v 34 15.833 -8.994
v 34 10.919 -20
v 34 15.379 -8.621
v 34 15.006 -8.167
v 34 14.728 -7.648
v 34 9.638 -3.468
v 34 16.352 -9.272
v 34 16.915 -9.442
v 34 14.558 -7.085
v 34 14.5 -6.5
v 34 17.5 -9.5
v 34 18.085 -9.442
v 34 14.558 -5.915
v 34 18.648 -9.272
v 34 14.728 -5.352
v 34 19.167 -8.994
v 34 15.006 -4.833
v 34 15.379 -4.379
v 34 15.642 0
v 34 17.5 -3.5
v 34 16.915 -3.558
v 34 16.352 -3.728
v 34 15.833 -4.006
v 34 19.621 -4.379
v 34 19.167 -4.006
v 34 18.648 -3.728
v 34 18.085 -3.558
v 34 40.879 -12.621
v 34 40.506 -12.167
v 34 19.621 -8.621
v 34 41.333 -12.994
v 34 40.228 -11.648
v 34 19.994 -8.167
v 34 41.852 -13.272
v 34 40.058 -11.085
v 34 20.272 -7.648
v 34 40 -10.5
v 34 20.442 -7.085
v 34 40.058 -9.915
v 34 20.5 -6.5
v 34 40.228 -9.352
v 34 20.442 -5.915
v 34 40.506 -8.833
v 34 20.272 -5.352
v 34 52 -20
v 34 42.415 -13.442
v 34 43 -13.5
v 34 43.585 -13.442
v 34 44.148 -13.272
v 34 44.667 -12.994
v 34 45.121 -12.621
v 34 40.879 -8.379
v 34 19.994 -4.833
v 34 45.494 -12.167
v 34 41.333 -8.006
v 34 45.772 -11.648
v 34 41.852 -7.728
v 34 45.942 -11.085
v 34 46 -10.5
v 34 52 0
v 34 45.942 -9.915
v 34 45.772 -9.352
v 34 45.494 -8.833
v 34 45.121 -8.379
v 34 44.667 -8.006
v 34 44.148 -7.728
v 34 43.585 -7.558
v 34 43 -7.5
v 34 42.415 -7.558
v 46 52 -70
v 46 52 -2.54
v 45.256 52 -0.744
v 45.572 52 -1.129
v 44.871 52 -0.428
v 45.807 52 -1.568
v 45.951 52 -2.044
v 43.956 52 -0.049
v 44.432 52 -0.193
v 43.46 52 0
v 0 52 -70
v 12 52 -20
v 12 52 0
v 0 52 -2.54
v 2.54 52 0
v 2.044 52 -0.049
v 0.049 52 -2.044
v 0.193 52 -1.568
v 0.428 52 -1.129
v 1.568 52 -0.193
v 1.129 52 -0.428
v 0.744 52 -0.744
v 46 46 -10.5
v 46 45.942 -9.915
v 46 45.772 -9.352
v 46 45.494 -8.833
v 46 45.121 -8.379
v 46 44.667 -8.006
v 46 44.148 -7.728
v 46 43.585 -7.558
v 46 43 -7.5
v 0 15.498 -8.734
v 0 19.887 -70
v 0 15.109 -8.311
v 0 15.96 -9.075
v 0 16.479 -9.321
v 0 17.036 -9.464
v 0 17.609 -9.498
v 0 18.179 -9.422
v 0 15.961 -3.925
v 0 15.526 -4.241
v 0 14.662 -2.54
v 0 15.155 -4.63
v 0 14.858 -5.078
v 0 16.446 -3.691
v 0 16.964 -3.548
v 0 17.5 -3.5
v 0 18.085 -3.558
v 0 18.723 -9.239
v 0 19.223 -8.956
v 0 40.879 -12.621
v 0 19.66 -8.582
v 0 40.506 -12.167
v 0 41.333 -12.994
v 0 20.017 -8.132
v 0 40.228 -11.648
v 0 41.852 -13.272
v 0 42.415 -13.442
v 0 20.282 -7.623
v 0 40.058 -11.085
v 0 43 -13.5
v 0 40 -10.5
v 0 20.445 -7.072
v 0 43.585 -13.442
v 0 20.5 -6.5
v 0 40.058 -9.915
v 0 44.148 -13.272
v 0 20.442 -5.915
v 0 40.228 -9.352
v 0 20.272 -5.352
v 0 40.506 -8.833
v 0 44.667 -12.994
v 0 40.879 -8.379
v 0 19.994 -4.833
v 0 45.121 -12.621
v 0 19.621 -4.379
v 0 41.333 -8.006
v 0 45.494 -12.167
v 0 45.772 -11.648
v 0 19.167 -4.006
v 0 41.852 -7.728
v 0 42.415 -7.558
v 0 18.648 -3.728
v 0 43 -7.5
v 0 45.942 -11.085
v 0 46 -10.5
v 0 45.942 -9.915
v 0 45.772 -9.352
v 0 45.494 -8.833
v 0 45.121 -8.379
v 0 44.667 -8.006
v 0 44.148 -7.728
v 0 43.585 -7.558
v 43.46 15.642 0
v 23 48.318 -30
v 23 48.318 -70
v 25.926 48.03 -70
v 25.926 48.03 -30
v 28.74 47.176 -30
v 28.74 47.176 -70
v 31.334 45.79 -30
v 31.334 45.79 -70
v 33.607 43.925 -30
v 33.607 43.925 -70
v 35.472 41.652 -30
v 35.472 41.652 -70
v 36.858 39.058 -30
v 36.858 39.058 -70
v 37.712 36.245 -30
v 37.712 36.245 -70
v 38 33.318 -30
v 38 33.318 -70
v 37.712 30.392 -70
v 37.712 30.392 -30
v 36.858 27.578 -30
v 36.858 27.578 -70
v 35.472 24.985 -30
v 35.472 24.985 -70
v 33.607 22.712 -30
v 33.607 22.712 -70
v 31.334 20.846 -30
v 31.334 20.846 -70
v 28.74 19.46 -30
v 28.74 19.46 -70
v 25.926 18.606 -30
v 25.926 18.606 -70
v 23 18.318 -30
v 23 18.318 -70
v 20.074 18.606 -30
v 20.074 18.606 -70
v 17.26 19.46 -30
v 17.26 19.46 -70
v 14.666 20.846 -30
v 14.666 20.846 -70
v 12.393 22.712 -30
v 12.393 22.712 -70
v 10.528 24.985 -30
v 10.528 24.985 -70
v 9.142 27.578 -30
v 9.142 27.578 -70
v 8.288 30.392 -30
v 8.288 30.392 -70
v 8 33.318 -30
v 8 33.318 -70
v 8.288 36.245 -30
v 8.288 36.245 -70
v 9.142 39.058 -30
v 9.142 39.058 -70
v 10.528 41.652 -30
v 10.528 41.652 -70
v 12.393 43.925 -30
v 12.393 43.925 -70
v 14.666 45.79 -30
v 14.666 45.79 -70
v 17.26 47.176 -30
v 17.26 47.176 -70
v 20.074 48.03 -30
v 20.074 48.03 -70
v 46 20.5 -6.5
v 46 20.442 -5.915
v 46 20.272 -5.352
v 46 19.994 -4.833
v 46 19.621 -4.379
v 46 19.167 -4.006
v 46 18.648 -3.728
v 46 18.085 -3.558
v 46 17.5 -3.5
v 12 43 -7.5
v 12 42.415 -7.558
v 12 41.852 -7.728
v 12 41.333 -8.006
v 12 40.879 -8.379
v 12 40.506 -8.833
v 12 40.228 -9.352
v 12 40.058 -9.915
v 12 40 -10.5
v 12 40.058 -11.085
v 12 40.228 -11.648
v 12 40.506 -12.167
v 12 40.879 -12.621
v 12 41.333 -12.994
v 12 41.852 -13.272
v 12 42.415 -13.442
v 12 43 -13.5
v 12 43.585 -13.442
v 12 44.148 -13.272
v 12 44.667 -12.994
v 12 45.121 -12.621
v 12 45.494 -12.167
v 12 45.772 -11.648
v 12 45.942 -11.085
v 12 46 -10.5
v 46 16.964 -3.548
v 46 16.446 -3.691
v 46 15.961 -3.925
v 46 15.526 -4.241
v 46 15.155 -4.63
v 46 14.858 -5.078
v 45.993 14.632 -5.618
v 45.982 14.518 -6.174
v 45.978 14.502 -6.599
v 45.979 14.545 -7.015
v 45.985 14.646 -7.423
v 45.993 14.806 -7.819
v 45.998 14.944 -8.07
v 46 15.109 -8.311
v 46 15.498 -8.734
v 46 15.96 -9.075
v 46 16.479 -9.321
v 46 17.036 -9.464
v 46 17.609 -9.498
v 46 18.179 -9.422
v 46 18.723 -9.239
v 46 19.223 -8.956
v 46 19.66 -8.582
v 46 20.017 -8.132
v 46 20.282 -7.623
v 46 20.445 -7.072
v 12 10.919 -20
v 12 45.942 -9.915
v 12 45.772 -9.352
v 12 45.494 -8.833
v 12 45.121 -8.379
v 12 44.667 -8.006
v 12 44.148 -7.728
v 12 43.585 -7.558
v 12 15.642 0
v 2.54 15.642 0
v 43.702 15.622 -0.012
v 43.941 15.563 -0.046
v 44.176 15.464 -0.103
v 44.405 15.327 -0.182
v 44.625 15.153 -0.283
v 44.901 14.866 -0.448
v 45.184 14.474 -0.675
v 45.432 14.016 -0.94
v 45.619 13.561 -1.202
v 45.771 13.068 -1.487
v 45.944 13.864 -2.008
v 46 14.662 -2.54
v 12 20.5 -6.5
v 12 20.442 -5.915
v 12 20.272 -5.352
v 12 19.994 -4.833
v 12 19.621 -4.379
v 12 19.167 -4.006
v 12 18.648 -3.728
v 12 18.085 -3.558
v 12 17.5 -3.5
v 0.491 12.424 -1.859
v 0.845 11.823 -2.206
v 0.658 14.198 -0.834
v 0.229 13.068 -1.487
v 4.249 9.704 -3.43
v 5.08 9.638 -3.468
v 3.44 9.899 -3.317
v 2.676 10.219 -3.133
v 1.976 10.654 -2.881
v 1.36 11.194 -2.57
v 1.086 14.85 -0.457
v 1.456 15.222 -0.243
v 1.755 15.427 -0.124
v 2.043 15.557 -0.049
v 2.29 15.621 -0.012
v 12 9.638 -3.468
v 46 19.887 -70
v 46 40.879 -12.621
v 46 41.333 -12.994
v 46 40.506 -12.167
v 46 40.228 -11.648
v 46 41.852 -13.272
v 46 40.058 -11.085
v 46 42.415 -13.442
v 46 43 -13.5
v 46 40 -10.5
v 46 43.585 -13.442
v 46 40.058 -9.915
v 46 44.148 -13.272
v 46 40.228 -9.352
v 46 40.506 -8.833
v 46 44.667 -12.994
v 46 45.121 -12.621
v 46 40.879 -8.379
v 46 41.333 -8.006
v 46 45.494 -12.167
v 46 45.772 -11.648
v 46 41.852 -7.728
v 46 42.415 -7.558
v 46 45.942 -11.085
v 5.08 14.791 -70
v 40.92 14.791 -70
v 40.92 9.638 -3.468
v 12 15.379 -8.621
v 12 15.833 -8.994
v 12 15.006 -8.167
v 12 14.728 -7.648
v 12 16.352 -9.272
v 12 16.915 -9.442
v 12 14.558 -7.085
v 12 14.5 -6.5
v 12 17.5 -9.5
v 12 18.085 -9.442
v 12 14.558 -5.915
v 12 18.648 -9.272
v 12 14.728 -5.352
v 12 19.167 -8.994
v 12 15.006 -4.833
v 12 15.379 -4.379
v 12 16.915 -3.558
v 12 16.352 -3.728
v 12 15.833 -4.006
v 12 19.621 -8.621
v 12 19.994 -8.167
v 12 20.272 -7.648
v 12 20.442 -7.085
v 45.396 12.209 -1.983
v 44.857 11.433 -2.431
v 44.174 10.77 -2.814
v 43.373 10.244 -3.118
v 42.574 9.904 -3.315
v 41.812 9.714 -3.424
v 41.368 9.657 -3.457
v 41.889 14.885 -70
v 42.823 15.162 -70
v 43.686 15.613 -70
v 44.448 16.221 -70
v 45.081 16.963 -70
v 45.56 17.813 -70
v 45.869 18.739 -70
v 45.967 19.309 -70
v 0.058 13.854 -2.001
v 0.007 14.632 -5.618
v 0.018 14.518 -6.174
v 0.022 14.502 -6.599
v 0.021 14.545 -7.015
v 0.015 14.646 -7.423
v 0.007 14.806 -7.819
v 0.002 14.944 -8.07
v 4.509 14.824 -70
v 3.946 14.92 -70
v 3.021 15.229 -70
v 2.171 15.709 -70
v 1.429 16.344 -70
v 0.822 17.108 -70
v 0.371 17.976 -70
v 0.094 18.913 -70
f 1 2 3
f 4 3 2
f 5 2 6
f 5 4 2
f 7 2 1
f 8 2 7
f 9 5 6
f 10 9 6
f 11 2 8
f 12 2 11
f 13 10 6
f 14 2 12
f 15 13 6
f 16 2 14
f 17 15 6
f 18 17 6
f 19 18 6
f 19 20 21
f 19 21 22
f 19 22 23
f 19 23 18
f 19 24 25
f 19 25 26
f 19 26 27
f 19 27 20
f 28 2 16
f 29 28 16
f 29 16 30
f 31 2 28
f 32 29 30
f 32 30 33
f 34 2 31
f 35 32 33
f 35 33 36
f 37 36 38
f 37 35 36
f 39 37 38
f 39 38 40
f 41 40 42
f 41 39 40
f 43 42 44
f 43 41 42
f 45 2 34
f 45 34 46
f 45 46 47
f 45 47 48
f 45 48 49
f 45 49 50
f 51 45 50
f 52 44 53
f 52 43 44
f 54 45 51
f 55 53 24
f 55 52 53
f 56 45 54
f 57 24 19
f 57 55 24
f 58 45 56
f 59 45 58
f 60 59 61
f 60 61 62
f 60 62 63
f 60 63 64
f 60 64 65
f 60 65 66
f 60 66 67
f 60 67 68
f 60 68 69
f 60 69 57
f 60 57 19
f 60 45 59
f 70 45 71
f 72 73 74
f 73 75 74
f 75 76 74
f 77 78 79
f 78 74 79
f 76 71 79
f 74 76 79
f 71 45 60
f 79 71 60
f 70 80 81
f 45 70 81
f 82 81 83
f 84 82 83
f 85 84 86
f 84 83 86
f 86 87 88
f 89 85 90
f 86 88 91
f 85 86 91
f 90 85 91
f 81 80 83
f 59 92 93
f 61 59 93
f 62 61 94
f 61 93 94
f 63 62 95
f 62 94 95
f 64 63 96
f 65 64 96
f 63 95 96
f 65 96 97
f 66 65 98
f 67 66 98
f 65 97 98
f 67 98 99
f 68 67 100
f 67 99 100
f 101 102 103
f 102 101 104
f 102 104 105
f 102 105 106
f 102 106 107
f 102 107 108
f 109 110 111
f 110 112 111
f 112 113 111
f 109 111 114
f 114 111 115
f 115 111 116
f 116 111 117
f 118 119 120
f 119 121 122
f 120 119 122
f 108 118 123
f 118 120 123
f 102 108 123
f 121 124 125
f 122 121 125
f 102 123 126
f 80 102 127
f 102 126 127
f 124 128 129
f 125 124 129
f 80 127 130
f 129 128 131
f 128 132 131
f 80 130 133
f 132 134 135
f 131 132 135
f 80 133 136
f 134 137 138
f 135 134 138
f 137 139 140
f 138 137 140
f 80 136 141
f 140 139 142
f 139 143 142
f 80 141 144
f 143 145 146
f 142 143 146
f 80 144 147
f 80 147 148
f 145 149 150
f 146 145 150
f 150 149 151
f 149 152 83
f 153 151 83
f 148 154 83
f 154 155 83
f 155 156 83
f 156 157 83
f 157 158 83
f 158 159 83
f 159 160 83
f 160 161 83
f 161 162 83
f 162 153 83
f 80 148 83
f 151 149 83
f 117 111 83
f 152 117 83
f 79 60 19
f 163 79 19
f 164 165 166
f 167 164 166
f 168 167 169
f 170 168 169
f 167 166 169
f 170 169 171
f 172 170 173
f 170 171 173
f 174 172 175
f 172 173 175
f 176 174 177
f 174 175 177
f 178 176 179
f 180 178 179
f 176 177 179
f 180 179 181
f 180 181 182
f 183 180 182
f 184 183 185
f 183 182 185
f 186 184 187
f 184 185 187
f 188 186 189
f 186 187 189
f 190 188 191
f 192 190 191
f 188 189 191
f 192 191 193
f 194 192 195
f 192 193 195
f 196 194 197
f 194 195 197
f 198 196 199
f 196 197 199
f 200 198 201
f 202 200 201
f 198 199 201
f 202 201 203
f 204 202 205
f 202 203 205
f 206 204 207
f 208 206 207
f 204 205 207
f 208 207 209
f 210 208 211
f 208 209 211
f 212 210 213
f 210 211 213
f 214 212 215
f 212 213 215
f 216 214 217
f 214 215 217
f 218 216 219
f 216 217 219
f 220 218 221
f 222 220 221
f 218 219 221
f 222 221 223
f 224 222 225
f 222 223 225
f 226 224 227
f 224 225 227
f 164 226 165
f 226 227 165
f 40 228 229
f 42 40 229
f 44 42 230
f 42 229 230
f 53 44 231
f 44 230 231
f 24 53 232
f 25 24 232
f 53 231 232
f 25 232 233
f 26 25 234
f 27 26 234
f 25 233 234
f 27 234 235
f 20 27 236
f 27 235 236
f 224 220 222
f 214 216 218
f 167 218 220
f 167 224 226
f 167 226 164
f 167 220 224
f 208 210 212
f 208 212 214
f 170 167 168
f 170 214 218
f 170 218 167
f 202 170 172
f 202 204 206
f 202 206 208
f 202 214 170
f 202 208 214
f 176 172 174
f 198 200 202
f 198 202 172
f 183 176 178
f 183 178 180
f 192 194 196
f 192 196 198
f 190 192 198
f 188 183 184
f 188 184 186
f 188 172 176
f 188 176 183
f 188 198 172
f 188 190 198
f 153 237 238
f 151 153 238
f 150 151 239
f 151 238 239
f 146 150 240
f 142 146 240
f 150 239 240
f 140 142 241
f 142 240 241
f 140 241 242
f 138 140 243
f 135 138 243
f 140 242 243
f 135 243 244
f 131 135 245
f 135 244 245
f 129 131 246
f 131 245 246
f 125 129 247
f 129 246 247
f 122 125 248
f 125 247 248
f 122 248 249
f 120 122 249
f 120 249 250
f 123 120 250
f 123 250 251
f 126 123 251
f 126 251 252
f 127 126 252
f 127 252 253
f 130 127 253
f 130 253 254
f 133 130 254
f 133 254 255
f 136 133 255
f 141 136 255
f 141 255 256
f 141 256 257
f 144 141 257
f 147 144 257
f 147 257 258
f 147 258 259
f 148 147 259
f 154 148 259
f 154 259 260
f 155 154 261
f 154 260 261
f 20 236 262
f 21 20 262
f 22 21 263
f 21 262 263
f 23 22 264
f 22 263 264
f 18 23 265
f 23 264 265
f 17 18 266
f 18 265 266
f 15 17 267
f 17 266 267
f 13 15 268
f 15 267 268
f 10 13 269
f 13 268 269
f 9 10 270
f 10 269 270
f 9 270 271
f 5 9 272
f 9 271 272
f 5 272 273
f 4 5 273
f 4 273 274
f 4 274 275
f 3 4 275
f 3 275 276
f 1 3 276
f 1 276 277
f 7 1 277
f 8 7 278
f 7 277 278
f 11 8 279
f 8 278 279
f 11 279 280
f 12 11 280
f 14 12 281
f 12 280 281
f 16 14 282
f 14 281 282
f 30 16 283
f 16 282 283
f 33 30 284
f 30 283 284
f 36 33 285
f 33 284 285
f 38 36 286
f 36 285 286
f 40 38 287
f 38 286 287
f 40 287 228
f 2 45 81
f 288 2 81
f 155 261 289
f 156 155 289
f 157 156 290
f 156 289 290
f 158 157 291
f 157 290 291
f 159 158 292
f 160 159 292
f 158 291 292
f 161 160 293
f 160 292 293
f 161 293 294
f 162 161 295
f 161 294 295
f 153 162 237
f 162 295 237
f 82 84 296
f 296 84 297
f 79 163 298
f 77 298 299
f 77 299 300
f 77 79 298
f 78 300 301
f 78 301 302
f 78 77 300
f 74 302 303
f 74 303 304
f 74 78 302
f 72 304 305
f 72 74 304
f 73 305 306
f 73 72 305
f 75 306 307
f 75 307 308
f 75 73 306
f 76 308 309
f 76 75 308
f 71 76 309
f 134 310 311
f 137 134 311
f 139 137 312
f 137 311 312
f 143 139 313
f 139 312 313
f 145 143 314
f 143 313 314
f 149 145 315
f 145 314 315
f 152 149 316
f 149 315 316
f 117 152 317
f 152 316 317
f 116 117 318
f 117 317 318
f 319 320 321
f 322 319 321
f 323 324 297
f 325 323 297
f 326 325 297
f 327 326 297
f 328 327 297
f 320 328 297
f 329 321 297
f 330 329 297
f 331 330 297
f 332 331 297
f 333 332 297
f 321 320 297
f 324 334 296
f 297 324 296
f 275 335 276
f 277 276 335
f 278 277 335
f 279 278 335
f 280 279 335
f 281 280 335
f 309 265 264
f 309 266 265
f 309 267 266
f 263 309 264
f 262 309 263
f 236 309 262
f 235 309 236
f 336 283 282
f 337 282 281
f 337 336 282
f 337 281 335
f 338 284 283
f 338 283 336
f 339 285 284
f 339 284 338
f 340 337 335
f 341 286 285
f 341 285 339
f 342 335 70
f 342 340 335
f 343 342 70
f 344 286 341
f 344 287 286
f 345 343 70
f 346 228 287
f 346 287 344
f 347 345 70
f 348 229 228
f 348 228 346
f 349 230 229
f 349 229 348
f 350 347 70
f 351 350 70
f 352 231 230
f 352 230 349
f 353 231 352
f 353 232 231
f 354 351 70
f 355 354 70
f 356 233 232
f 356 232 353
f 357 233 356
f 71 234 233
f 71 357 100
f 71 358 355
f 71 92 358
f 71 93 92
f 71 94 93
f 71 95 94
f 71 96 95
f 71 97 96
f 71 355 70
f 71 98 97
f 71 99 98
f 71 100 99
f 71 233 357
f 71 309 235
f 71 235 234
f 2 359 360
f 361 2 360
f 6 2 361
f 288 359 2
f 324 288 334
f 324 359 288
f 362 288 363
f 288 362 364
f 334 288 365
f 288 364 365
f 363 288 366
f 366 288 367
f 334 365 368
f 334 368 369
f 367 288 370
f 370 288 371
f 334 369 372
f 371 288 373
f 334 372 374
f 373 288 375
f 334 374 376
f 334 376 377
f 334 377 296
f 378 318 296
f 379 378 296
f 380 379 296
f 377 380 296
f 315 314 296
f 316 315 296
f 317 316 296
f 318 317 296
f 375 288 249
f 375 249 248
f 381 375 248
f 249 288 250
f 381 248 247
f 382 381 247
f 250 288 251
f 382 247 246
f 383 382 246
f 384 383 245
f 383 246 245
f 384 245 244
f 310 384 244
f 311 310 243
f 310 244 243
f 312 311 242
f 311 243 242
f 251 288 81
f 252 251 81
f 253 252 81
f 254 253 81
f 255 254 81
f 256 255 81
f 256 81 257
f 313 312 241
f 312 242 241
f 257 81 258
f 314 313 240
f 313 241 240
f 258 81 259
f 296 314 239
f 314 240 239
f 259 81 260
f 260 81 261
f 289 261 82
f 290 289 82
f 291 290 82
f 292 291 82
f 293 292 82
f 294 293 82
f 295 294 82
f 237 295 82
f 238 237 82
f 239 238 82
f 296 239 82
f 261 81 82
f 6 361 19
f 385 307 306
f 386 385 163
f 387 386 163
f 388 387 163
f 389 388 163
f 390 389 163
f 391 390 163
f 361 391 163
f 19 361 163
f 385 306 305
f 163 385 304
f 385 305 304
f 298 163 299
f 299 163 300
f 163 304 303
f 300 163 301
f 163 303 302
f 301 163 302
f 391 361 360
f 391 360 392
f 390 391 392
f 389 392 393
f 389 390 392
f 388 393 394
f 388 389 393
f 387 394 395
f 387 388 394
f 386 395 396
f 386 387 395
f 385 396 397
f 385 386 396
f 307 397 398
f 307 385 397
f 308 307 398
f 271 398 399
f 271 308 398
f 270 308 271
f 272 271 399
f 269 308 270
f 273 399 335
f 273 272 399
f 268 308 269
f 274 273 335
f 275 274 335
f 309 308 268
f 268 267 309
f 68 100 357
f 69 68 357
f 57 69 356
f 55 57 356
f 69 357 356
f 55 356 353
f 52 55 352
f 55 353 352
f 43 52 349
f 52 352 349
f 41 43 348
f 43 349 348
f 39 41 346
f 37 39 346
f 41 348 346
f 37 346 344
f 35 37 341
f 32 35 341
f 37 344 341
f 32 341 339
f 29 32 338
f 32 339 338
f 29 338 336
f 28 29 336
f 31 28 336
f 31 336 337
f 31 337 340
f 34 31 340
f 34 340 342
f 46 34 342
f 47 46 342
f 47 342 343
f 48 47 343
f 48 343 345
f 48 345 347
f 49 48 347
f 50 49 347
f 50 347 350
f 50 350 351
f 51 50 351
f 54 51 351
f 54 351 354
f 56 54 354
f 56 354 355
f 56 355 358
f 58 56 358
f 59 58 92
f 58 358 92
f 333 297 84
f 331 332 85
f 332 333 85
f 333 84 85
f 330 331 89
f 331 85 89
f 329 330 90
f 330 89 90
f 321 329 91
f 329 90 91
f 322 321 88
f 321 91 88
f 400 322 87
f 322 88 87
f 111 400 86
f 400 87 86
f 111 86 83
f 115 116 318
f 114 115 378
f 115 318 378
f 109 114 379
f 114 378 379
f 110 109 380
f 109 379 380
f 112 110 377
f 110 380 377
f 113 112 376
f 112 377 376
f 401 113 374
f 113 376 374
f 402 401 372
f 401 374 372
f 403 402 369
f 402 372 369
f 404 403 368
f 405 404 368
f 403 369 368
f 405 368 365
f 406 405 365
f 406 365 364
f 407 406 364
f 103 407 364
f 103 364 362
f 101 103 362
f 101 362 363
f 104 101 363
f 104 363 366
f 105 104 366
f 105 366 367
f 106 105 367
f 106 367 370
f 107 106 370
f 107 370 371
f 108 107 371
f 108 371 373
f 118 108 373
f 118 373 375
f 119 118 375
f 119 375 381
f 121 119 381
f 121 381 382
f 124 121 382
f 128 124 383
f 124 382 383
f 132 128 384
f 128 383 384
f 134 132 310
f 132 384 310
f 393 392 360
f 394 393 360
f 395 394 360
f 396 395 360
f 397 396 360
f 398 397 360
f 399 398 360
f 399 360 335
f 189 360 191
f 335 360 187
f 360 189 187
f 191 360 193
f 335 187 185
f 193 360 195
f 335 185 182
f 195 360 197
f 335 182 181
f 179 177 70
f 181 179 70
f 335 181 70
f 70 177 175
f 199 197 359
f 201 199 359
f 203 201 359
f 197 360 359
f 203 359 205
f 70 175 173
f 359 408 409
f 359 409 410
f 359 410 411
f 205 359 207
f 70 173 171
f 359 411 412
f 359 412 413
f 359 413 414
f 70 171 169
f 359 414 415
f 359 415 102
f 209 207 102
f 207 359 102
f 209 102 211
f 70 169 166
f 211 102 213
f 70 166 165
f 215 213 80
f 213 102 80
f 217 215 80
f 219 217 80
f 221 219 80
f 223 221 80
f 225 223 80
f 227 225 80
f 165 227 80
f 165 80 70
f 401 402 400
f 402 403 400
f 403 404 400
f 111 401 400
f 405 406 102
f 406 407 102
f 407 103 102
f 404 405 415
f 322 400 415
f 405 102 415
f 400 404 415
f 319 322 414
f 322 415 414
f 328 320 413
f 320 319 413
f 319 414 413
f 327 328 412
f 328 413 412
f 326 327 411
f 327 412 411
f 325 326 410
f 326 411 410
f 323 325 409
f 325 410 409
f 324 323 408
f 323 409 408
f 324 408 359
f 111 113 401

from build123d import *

# Parameters (mm, degrees)
F1_DEPTH     = 46
F3_DEPTH     = 40
F5_DEPTH     = 254
F6_W         = 22
F6_H         = 20
F7_DEPTH     = 1346.2
F8_DEPTH     = 65
F10_DEPTH    = 127
F12_DEPTH    = 254
F14_DEPTH    = 254
F15_T1_DEPTH = 103.8636030304
F15_T3_DEPTH = 103.8636030304
F17_T1_DEPTH = 49.0578822911


# Not quite as in the source:
# - a fillet or chamfer that OpenCascade refuses, or shapes differently, is made with other operations: its cross-section is extruded or revolved along the edge and cut away or added
# - a feature of the source that left no trace in its solid (it failed there, or was rolled back) is left out


with BuildPart() as f1:
    # F0 (on Right) → F1 (new body)
    with BuildSketch(Plane.YZ):
        Polygon((52, 0), (0, 0), (12, -60), (12, -70), (52, -70), align=None)
    extrude(amount=F1_DEPTH)

    # F2 (on face) → F3 (cut)
    with BuildSketch(Plane(origin=(0, 0, -70), x_dir=(1, 0, 0), z_dir=(0, 0, -1))):
        with BuildLine():
            Line((23, -33.3181476), (38, -33.3181476))
            ThreePointArc((38, -33.3181476), (12.3933982822, -22.7115458822), (23, -48.3181476))
            Line((23, -48.3181476), (23, -33.3181476))
        make_face()
        with BuildLine():
            ThreePointArc((23, -48.3181476), (33.6066017178, -43.9247493178), (38, -33.3181476))
            Line((38, -33.3181476), (23, -33.3181476))
            Line((23, -33.3181476), (23, -48.3181476))
        make_face()
    extrude(amount=-F3_DEPTH, mode=Mode.SUBTRACT)

    # F4 (on face) → F5 (cut)
    with BuildSketch(Plane.YZ.offset(46)):
        with BuildLine():
            Line((17.5, -6.5), (20.5, -6.5))
            ThreePointArc((20.5, -6.5), (19.6213203436, -4.3786796564), (17.5, -3.5))
            Line((17.5, -3.5), (17.5, -6.5))
        make_face()
        with BuildLine():
            ThreePointArc((17.5, -3.5), (15.3786796564, -8.6213203436), (20.5, -6.5))
            Line((20.5, -6.5), (17.5, -6.5))
            Line((17.5, -6.5), (17.5, -3.5))
        make_face()
    extrude(amount=-F5_DEPTH, mode=Mode.SUBTRACT)

    # F6 (on face) → F7 (cut)
    with BuildSketch(Plane(origin=(0, 52, 0), x_dir=(-1, 0, 0), z_dir=(0, 1, 0))):
        with Locations((-23, -10)):
            Rectangle(F6_W, F6_H)
    extrude(amount=-F7_DEPTH, mode=Mode.SUBTRACT)

    # F4 (on face) → F8 (cut)
    with BuildSketch(Plane.YZ.offset(46)):
        with BuildLine():
            ThreePointArc((43, -7.5), (40.8786796564, -12.6213203436), (46, -10.5))
            ThreePointArc((46, -10.5), (45.1213203436, -8.3786796564), (43, -7.5))
        make_face()
    extrude(amount=-F8_DEPTH, mode=Mode.SUBTRACT)

    # F9 (on face) → F10 (cut)
    with BuildSketch(Plane.YZ.offset(46)):
        Polygon((1.1435132474, -8.0939428881), (1.6304426827, -8.0939428881), (15.6421177089, 0), (0, 0), align=None)
    extrude(amount=-F10_DEPTH, mode=Mode.SUBTRACT)

    # F11 (on Right) → F12 (cut)
    with BuildSketch(Plane.YZ):
        Polygon((0, -70.3560113907), (14.7977182642, -70.0814500451), (9.3696815893, 0), (0, 0), align=None)
    extrude(amount=F12_DEPTH, mode=Mode.SUBTRACT)

    # F13 (on face) → F14 (cut)
    with BuildSketch(Plane.XY):
        with BuildLine():
            add(Edge.make_bspline(
                [(0, 12.6551715657), (0, 9.9420361221), (2.5992305018, 9.7406599671), (3.9225574583, 9.6255876124)],
                knots=[0, 0, 0, 0, 4.9562925603, 4.9562925603, 4.9562925603, 4.9562925603], degree=3))
            Line((0, 12.6551715657), (0, 9.539283812))
            Line((0, 9.539283812), (3.9225574583, 9.6255876124))
        make_face()
        with BuildLine():
            Line((46, 9.539283812), (46, 12.6551715657))
            add(Edge.make_bspline(
                [(46, 12.6551715657), (46, 9.9420361221), (43.4007694982, 9.7406599671), (42.0774425417, 9.6255876124)],
                knots=[0, 0, 0, 0, 4.9562925603, 4.9562925603, 4.9562925603, 4.9562925603], degree=3))
            Line((42.0774425417, 9.6255876124), (46, 9.539283812))
        make_face()
    extrude(amount=-F14_DEPTH, mode=Mode.SUBTRACT)

    # F15: fillet of radius 5.08 on 2 edges, made by hand

    # F15_s2 → F15_t1 (cut)
    with BuildSketch(Plane(origin=(0, 6.4583208178, -83.3834616235), x_dir=(1, 0, 0), z_dir=(0, -0.0772219774, 0.9970139248))):
        with BuildLine():
            ThreePointArc((0, 14.4217030153), (1.4878975516, 10.8296005669), (5.08, 9.3417030153))
            Line((5.08, 9.3417030153), (0, 9.3417030153))
            Line((0, 9.3417030153), (0, 14.4217030153))
        make_face()
    extrude(amount=F15_T1_DEPTH, mode=Mode.SUBTRACT)

    # F15_s4 → F15_t3 (cut)
    with BuildSketch(Plane(origin=(0, -1.5622319844, 20.169996876), x_dir=(1, 0, 0), z_dir=(0, 0.0772219774, -0.9970139248))):
        with BuildLine():
            ThreePointArc((40.92, -9.3417030153), (44.5121024484, -10.8296005669), (46, -14.4217030153))
            Line((46, -14.4217030153), (46, -9.3417030153))
            Line((46, -9.3417030153), (40.92, -9.3417030153))
        make_face()
    extrude(amount=F15_T3_DEPTH, mode=Mode.SUBTRACT)

    # F17: fillet of radius 2.54 on 2 edges, made by hand

    # F17_s2 → F17_t1 (cut)
    with BuildSketch(Plane.XZ.offset(-58.35)):
        with BuildLine():
            ThreePointArc((2.54, 0), (0.7439487758, -0.7439487758), (0, -2.54))
            Line((0, -2.54), (0, 0))
            Line((0, 0), (2.54, 0))
        make_face()
        with BuildLine():
            ThreePointArc((43.46, 0), (45.2560512242, -0.7439487758), (46, -2.54))
            Line((46, -2.54), (46, 0))
            Line((46, 0), (43.46, 0))
        make_face()
    extrude(amount=F17_T1_DEPTH, mode=Mode.SUBTRACT)


solid = f1.part
